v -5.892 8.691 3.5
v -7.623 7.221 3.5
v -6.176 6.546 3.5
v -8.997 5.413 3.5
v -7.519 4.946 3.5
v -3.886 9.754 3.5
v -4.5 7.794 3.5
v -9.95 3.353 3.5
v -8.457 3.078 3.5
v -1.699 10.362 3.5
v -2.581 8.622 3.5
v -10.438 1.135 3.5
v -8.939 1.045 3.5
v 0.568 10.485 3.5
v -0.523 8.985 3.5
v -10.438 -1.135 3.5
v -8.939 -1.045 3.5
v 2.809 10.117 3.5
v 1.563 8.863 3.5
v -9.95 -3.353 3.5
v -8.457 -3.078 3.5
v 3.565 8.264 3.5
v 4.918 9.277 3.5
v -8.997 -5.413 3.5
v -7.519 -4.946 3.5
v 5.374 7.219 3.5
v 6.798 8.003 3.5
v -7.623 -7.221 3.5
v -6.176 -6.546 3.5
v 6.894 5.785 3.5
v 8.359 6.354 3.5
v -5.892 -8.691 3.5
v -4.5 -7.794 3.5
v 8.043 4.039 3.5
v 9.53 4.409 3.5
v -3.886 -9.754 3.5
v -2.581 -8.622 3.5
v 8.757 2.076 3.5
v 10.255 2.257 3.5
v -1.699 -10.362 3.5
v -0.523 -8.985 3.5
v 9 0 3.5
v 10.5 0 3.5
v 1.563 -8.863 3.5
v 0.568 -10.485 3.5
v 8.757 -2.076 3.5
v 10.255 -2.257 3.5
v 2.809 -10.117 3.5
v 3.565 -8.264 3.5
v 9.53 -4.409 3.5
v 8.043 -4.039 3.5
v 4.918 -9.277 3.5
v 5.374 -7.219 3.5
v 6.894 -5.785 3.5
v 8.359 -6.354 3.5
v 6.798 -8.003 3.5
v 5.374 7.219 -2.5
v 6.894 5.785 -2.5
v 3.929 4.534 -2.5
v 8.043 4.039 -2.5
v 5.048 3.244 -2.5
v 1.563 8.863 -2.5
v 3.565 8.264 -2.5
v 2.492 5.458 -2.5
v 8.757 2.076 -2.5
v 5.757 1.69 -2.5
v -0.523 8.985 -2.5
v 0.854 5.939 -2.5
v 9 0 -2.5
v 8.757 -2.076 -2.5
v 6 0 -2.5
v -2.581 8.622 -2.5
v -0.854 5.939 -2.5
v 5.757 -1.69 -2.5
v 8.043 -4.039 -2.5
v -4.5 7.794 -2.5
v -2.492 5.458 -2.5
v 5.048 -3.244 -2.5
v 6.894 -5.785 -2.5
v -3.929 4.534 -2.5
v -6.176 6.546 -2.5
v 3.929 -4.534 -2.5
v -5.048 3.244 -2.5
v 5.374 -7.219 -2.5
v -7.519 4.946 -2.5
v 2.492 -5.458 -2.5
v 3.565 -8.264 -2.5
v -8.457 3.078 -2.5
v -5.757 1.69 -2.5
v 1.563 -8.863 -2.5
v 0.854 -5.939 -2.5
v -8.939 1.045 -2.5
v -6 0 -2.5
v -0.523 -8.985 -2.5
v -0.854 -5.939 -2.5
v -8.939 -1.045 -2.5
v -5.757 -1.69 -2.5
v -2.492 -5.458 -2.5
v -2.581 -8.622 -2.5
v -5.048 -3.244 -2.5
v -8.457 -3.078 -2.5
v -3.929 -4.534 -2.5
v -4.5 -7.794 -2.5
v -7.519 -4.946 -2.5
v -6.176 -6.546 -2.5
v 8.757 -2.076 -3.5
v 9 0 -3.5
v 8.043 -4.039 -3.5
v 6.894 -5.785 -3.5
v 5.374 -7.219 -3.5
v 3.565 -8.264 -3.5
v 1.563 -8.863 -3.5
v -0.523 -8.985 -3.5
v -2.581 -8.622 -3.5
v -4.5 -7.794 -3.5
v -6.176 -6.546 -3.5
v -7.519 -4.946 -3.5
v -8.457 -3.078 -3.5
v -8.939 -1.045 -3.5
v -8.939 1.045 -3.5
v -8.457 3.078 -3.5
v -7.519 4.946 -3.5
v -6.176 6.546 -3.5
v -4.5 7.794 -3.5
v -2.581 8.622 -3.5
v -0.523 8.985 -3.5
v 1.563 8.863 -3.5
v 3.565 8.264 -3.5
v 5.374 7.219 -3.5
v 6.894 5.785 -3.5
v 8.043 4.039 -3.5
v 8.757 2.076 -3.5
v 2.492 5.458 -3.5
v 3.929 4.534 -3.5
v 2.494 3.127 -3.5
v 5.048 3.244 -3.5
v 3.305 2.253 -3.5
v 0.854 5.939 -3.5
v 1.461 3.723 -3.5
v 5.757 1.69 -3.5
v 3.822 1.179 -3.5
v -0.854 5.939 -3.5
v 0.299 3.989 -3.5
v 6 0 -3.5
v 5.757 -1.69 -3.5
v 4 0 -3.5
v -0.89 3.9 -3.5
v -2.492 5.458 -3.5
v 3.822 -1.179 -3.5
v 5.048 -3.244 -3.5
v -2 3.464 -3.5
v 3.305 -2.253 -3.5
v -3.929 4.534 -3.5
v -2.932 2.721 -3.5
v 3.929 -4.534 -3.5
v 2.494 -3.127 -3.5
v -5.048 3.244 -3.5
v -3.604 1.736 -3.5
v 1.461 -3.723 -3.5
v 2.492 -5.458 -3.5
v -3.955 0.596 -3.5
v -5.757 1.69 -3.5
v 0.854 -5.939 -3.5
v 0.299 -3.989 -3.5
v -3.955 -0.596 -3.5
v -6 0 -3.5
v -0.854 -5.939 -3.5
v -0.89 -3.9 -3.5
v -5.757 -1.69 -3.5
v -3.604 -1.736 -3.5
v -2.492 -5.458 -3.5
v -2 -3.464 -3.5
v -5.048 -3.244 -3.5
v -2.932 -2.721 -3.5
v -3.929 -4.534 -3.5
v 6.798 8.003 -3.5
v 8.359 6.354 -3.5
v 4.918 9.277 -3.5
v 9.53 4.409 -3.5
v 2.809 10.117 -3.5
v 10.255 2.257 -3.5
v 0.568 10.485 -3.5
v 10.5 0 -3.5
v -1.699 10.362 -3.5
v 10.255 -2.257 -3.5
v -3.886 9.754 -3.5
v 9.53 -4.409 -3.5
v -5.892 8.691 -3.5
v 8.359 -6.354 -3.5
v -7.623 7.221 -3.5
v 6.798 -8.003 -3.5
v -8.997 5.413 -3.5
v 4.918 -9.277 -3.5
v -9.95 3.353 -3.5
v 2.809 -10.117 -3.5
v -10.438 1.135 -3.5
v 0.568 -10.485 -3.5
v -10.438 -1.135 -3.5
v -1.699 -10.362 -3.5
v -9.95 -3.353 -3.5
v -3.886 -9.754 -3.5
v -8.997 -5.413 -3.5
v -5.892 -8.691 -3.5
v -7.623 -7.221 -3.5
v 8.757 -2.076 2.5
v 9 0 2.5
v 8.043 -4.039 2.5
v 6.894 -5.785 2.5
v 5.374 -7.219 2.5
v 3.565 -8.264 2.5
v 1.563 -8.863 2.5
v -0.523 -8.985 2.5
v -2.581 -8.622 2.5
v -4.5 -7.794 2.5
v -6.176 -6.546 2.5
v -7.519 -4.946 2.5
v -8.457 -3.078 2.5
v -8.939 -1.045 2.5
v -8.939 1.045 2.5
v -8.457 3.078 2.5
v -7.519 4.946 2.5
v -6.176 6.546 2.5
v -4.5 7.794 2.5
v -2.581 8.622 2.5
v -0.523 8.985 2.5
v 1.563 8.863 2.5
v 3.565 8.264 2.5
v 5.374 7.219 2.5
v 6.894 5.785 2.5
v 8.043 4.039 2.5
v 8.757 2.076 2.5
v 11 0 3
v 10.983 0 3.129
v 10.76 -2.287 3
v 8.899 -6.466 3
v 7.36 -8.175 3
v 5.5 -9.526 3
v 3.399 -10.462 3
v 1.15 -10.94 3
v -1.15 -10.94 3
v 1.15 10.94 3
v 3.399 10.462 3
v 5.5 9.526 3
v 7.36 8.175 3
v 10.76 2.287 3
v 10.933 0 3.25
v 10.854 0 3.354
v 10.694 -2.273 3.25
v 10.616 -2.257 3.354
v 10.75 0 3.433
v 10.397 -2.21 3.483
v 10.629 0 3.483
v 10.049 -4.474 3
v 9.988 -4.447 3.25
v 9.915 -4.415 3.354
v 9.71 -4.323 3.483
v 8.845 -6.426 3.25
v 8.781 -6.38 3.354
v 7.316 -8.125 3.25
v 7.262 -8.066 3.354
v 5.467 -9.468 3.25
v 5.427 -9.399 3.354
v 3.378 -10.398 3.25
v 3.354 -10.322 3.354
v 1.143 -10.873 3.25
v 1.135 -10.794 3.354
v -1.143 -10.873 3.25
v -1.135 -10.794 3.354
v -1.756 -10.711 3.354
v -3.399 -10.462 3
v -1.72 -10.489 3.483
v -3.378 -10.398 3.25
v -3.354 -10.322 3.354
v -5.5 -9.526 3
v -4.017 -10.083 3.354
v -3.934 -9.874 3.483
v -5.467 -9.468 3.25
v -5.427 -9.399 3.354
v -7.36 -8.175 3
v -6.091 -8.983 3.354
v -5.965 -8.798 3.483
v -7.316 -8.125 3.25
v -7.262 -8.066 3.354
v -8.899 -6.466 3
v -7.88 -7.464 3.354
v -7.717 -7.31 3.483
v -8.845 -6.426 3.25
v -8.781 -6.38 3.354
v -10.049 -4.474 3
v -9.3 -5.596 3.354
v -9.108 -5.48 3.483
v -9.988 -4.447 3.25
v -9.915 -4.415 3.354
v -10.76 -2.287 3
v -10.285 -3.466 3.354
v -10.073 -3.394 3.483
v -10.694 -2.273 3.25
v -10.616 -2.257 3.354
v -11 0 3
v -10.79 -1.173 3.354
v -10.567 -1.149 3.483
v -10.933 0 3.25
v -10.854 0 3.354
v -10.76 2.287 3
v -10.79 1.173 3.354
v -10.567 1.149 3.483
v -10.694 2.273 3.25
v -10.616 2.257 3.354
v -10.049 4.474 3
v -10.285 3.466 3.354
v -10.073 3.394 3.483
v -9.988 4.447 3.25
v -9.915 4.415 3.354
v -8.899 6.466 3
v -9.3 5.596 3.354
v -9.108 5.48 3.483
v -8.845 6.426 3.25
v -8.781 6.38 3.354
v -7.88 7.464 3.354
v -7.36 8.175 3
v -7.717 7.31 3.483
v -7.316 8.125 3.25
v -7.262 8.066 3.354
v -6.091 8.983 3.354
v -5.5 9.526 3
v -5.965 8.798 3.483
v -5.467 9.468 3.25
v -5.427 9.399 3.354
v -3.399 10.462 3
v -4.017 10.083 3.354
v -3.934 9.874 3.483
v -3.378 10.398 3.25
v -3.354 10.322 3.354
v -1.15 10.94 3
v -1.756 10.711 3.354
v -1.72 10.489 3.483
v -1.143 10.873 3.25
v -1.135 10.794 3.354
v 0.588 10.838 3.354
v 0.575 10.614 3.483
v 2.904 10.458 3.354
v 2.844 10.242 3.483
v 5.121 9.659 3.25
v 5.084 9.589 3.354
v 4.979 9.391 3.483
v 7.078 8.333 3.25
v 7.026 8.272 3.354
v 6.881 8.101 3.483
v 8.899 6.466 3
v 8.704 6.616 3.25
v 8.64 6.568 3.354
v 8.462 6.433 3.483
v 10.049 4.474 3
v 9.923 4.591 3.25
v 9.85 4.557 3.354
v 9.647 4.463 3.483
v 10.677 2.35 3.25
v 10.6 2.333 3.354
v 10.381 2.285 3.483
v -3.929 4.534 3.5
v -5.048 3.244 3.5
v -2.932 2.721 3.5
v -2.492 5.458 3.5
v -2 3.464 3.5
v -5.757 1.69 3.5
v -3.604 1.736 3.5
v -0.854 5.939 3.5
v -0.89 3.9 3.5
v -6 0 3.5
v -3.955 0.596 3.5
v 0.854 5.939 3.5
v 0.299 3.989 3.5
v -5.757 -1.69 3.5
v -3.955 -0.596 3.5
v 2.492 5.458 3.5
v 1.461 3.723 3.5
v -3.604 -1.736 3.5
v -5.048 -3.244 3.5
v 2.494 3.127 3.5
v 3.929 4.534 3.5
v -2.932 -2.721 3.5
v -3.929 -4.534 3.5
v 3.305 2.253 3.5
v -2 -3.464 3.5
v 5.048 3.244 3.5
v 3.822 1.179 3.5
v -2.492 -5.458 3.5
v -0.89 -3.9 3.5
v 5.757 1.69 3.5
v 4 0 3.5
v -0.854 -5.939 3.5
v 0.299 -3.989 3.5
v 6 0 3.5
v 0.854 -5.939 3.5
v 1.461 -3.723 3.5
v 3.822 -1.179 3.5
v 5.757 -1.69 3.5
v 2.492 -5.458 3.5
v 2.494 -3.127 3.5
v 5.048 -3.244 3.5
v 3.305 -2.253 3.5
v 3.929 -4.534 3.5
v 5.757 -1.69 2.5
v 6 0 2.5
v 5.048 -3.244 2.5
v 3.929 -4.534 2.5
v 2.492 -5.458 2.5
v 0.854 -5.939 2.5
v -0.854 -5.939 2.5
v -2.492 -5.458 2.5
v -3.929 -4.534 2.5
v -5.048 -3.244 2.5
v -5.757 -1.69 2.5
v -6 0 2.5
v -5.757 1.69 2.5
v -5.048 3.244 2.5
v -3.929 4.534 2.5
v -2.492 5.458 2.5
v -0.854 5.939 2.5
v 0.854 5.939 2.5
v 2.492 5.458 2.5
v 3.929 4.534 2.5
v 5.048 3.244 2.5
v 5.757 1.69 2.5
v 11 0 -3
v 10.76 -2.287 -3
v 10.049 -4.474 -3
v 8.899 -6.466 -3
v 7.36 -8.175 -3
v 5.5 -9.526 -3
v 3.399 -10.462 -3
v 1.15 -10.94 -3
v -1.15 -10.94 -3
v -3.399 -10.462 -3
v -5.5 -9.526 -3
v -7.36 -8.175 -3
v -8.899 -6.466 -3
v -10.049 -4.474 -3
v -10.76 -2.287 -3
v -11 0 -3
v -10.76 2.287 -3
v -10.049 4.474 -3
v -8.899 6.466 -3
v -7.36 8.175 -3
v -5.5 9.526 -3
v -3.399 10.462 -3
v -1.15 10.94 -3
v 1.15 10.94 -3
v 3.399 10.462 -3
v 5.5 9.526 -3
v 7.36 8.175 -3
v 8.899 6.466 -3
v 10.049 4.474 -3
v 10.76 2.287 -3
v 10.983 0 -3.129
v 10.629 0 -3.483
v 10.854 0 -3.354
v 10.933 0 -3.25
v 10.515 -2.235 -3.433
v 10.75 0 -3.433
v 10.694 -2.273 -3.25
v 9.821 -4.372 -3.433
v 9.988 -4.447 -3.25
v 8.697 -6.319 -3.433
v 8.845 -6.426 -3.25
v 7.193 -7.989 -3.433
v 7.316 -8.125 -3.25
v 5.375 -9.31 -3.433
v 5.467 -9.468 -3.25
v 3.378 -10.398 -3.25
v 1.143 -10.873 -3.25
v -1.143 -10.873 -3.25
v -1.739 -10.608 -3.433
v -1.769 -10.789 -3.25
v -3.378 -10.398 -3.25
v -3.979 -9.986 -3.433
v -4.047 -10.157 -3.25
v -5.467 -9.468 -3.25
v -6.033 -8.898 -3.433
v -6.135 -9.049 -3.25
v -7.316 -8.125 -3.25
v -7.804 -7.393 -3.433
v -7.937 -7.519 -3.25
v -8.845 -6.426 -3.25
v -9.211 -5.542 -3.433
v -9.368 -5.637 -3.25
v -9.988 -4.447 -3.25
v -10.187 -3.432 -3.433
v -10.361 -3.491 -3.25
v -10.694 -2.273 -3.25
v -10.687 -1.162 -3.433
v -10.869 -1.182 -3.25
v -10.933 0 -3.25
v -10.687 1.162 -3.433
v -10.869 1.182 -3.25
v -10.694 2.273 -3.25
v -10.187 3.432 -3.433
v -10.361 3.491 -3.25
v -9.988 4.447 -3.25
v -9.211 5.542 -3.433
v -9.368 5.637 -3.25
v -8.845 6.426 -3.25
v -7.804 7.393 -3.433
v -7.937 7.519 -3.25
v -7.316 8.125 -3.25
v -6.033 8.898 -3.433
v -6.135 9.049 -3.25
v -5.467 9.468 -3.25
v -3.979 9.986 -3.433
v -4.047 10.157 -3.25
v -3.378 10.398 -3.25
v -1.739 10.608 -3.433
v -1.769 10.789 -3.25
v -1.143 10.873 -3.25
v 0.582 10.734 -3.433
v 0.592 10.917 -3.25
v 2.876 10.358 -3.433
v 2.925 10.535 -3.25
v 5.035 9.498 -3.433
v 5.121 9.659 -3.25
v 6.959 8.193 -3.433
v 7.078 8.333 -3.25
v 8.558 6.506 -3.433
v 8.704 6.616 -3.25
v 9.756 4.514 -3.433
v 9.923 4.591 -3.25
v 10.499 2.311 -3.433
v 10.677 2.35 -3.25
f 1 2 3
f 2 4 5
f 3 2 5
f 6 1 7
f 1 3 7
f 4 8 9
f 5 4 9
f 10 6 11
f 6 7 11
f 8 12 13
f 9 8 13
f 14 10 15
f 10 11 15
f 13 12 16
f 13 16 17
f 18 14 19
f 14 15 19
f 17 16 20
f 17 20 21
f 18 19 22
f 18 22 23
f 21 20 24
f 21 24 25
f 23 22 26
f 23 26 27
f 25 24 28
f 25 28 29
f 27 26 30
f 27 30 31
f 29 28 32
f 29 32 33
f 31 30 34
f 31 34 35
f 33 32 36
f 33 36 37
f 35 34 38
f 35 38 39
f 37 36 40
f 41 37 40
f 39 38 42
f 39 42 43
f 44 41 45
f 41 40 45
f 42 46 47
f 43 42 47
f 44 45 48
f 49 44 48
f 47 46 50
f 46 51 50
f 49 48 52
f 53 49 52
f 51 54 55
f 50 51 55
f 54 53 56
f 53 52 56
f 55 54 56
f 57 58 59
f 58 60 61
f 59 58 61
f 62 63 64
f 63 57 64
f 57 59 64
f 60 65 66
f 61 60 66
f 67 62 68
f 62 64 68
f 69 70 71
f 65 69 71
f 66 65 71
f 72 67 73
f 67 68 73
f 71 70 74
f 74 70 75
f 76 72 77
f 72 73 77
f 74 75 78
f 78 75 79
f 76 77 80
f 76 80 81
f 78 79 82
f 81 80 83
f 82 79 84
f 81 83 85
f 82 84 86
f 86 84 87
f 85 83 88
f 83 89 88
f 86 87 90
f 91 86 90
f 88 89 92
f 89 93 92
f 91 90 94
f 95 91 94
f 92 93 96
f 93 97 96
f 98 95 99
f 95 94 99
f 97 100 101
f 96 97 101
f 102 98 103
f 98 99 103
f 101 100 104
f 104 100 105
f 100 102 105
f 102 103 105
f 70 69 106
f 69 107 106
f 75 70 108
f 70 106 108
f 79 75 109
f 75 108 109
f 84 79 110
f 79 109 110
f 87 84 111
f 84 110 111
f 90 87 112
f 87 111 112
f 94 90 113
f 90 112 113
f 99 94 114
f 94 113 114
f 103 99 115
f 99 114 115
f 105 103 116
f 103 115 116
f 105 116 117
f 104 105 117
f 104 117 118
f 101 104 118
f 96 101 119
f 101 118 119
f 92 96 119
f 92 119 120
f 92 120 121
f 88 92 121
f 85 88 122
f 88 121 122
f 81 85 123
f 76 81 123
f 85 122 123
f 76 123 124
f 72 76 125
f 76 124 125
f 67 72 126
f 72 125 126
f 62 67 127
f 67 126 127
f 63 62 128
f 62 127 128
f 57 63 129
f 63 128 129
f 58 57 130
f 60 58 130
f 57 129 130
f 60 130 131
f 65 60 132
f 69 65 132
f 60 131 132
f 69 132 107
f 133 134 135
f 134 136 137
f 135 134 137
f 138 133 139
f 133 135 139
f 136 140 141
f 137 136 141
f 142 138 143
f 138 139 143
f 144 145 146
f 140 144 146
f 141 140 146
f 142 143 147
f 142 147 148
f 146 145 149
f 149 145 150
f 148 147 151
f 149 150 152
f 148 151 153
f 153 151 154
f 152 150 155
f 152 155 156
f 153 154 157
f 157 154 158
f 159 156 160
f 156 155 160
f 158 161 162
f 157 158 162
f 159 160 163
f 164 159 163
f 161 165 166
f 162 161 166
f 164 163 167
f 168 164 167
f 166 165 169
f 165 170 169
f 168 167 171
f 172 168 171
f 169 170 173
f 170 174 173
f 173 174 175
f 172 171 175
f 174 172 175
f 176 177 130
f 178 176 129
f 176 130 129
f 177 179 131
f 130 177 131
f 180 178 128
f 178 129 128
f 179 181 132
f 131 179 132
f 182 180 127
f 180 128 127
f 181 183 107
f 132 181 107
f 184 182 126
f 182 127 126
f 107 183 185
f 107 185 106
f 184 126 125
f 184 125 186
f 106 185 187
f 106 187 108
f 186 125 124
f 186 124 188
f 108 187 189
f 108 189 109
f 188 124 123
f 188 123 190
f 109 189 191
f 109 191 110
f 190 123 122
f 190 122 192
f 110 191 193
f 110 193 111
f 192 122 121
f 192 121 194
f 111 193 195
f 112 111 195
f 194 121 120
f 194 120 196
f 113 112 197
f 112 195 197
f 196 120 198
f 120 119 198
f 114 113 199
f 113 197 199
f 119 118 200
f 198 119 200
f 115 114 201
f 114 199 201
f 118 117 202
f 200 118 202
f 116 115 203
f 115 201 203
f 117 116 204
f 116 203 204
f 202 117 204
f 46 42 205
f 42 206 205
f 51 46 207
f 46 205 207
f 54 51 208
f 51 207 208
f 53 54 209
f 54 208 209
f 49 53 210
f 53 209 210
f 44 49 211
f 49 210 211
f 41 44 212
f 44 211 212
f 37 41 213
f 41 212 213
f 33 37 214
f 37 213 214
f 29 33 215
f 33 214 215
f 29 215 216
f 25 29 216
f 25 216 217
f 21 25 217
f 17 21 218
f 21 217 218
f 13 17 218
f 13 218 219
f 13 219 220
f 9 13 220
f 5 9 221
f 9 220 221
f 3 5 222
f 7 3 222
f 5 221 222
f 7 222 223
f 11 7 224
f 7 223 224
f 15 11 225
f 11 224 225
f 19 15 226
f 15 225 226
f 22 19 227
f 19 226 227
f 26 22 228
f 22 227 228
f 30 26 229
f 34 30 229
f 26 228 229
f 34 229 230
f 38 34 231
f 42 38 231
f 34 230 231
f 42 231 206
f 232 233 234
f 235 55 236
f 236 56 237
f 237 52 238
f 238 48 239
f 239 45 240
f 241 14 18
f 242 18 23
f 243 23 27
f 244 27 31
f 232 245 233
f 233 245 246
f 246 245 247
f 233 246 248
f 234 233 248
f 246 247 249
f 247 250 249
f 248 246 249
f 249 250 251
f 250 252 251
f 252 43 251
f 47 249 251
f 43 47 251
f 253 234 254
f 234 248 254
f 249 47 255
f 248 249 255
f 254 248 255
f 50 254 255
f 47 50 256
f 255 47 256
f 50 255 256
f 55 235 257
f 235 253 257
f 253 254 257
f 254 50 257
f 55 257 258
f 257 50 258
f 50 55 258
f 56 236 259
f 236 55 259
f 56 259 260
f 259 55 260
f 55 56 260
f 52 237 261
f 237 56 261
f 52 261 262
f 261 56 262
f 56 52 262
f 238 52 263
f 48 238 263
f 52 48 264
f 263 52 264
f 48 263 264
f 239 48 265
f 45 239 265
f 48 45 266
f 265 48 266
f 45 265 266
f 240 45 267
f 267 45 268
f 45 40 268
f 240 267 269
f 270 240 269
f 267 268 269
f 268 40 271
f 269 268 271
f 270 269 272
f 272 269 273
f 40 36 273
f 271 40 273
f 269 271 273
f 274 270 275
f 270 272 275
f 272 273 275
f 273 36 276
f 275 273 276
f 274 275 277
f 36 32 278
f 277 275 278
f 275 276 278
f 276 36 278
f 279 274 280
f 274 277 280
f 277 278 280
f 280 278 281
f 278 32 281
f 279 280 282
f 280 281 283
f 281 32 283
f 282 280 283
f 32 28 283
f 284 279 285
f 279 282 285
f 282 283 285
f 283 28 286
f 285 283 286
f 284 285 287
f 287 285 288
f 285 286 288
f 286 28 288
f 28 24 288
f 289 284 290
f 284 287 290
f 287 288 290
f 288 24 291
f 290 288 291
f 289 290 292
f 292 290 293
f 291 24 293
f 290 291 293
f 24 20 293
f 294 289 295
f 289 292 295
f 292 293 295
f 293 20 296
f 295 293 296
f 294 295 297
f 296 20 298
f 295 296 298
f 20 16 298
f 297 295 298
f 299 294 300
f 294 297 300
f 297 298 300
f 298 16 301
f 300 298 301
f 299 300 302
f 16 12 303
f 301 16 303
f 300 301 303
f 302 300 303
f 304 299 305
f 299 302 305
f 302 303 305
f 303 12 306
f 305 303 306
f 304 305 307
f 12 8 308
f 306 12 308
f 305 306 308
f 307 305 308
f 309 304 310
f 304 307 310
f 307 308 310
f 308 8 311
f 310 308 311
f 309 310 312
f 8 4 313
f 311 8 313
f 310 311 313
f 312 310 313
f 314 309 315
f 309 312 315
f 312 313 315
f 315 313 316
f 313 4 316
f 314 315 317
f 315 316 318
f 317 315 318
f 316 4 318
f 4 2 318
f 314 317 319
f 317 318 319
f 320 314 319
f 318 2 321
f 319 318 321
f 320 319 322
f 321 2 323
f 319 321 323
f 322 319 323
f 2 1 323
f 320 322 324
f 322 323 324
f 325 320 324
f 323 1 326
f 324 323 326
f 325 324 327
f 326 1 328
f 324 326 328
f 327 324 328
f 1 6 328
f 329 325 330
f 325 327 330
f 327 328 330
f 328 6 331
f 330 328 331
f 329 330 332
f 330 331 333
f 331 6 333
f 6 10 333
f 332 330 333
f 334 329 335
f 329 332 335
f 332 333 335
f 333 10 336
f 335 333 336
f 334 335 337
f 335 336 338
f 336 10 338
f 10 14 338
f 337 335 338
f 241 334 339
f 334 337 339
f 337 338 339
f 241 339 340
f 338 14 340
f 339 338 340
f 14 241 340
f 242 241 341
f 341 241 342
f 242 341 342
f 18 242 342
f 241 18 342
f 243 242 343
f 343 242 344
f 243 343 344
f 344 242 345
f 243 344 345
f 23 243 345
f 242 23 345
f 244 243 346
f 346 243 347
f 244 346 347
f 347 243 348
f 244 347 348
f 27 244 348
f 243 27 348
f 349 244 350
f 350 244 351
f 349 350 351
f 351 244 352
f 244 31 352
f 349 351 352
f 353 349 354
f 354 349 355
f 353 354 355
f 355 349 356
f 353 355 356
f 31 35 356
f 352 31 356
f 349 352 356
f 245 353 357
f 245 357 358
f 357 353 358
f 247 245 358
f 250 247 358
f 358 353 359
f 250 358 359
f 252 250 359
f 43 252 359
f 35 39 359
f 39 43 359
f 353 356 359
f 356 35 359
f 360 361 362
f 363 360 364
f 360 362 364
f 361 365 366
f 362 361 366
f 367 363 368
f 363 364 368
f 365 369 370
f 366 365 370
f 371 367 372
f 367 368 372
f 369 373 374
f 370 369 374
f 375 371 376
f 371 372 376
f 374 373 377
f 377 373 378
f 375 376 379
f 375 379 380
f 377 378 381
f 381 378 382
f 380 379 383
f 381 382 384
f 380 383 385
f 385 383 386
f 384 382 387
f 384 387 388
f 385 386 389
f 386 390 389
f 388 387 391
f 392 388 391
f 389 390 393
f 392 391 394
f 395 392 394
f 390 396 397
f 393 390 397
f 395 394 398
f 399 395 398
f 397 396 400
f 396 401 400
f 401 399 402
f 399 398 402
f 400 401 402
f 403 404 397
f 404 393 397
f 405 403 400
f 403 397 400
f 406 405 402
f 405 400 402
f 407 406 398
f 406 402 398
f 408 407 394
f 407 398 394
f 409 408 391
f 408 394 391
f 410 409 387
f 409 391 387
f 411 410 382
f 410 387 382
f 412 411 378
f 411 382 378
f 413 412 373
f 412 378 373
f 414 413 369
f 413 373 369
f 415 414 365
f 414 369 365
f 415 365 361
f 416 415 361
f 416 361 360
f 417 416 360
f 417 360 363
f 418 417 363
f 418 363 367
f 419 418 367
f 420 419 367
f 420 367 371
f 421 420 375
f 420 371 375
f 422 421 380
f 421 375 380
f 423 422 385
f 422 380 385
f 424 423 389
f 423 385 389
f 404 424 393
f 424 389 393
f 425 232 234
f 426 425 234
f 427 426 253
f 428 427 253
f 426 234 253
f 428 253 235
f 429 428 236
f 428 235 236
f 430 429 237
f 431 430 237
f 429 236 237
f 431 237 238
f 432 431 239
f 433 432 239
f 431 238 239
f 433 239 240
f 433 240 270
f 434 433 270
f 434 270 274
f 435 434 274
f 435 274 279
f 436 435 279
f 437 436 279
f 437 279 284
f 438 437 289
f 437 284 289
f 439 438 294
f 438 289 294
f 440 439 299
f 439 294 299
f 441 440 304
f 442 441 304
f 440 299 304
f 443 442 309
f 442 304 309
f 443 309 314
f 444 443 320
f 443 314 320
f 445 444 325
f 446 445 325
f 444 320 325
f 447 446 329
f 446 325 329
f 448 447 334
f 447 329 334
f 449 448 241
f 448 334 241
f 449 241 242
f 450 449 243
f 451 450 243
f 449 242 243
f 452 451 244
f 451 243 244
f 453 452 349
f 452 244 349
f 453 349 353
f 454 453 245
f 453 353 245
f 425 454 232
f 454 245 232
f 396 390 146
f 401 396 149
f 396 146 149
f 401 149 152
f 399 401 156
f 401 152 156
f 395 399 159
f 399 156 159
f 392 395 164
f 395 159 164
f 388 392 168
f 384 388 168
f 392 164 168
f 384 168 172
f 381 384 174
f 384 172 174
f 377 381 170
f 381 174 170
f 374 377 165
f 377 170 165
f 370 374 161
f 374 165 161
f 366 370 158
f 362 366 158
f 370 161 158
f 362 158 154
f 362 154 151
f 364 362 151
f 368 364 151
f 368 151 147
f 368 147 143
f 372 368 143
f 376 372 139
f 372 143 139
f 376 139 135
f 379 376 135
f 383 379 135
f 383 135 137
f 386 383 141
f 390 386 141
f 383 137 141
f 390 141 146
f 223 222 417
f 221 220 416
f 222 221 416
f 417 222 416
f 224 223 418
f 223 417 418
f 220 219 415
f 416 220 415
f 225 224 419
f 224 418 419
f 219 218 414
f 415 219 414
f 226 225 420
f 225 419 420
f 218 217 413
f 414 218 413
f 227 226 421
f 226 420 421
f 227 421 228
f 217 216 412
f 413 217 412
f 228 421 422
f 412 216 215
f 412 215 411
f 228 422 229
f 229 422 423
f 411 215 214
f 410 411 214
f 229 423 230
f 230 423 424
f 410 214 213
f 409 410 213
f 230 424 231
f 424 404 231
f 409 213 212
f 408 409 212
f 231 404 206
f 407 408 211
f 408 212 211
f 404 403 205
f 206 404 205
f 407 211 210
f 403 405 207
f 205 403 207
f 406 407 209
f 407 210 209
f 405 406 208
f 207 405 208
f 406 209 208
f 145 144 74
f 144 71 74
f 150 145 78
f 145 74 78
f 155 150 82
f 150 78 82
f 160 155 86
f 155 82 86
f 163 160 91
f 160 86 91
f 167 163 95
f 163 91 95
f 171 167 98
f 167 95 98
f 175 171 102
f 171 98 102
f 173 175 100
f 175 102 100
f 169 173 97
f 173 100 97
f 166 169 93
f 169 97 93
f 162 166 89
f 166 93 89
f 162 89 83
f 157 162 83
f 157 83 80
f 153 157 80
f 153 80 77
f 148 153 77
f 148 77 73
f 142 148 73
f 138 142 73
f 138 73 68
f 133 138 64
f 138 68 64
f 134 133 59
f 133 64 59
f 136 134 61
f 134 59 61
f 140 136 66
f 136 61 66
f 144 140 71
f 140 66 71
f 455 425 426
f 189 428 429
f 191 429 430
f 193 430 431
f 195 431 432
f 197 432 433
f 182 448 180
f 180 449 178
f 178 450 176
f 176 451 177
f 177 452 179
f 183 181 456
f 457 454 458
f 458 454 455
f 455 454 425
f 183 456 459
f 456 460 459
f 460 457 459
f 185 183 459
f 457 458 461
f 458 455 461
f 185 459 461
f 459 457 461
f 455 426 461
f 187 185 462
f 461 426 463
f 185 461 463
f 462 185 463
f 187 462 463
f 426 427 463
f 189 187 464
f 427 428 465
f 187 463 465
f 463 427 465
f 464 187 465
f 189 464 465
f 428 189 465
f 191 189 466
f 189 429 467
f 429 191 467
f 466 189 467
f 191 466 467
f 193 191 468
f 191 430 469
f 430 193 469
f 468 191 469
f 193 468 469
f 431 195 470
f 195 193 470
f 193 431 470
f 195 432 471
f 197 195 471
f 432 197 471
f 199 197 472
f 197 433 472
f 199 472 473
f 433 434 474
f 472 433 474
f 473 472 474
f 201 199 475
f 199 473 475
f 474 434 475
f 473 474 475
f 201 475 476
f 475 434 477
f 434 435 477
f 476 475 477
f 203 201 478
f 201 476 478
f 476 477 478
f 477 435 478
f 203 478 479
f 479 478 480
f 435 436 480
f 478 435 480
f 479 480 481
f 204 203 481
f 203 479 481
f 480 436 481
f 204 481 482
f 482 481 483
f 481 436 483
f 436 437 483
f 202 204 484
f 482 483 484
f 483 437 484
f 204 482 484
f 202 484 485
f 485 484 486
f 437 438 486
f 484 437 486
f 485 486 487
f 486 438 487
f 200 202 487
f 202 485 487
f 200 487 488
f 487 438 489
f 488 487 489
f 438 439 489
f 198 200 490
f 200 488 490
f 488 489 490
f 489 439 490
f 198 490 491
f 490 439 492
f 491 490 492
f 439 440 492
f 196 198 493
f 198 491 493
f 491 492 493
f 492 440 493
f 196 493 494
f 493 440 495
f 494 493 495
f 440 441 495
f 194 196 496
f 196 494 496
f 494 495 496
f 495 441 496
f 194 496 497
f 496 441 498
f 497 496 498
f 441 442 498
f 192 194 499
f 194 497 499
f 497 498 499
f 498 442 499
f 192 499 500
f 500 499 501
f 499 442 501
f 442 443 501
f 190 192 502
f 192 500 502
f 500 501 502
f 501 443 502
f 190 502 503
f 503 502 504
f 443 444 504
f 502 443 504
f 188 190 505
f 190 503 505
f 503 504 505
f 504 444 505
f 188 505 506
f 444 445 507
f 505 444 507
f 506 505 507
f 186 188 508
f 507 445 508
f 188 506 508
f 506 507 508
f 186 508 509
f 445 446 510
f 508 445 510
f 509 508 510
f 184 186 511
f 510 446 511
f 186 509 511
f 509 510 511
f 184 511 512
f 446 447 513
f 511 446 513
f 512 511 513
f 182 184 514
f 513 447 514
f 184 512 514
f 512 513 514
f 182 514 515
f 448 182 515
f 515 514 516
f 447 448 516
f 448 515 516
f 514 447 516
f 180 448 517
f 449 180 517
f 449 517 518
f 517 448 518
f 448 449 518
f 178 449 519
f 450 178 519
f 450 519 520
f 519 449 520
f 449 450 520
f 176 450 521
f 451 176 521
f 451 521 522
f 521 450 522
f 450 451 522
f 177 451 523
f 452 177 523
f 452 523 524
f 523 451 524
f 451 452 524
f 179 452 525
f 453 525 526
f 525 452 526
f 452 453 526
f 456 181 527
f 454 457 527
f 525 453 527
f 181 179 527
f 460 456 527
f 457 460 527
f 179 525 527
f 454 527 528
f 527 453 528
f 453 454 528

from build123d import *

# Parameters (mm, degrees)
FILLET1_R = 0.5


with BuildPart() as part:
    # Sketch1 → Revolve1 (revolve)
    with BuildSketch(Plane.XZ):
        Polygon((6, -3.5), (6, -2.5), (9, -2.5), (9, -3.5), (11, -3.5), (11, 3.5), (9, 3.5), (9, 2.5), (6, 2.5), (6, 3.5), (4, 3.5), (4, -3.5), align=None)
    revolve(axis=Axis((0, 0, 3.5), (0, 0, -1)))

    # Fillet1
    fillet1_edges = [part.edges().sort_by_distance(p)[0] for p in [
        (-11, 0, 3.5),
        (-11, 0, -3.5),
    ]]
    fillet(fillet1_edges, radius=FILLET1_R)


solid = part.part
